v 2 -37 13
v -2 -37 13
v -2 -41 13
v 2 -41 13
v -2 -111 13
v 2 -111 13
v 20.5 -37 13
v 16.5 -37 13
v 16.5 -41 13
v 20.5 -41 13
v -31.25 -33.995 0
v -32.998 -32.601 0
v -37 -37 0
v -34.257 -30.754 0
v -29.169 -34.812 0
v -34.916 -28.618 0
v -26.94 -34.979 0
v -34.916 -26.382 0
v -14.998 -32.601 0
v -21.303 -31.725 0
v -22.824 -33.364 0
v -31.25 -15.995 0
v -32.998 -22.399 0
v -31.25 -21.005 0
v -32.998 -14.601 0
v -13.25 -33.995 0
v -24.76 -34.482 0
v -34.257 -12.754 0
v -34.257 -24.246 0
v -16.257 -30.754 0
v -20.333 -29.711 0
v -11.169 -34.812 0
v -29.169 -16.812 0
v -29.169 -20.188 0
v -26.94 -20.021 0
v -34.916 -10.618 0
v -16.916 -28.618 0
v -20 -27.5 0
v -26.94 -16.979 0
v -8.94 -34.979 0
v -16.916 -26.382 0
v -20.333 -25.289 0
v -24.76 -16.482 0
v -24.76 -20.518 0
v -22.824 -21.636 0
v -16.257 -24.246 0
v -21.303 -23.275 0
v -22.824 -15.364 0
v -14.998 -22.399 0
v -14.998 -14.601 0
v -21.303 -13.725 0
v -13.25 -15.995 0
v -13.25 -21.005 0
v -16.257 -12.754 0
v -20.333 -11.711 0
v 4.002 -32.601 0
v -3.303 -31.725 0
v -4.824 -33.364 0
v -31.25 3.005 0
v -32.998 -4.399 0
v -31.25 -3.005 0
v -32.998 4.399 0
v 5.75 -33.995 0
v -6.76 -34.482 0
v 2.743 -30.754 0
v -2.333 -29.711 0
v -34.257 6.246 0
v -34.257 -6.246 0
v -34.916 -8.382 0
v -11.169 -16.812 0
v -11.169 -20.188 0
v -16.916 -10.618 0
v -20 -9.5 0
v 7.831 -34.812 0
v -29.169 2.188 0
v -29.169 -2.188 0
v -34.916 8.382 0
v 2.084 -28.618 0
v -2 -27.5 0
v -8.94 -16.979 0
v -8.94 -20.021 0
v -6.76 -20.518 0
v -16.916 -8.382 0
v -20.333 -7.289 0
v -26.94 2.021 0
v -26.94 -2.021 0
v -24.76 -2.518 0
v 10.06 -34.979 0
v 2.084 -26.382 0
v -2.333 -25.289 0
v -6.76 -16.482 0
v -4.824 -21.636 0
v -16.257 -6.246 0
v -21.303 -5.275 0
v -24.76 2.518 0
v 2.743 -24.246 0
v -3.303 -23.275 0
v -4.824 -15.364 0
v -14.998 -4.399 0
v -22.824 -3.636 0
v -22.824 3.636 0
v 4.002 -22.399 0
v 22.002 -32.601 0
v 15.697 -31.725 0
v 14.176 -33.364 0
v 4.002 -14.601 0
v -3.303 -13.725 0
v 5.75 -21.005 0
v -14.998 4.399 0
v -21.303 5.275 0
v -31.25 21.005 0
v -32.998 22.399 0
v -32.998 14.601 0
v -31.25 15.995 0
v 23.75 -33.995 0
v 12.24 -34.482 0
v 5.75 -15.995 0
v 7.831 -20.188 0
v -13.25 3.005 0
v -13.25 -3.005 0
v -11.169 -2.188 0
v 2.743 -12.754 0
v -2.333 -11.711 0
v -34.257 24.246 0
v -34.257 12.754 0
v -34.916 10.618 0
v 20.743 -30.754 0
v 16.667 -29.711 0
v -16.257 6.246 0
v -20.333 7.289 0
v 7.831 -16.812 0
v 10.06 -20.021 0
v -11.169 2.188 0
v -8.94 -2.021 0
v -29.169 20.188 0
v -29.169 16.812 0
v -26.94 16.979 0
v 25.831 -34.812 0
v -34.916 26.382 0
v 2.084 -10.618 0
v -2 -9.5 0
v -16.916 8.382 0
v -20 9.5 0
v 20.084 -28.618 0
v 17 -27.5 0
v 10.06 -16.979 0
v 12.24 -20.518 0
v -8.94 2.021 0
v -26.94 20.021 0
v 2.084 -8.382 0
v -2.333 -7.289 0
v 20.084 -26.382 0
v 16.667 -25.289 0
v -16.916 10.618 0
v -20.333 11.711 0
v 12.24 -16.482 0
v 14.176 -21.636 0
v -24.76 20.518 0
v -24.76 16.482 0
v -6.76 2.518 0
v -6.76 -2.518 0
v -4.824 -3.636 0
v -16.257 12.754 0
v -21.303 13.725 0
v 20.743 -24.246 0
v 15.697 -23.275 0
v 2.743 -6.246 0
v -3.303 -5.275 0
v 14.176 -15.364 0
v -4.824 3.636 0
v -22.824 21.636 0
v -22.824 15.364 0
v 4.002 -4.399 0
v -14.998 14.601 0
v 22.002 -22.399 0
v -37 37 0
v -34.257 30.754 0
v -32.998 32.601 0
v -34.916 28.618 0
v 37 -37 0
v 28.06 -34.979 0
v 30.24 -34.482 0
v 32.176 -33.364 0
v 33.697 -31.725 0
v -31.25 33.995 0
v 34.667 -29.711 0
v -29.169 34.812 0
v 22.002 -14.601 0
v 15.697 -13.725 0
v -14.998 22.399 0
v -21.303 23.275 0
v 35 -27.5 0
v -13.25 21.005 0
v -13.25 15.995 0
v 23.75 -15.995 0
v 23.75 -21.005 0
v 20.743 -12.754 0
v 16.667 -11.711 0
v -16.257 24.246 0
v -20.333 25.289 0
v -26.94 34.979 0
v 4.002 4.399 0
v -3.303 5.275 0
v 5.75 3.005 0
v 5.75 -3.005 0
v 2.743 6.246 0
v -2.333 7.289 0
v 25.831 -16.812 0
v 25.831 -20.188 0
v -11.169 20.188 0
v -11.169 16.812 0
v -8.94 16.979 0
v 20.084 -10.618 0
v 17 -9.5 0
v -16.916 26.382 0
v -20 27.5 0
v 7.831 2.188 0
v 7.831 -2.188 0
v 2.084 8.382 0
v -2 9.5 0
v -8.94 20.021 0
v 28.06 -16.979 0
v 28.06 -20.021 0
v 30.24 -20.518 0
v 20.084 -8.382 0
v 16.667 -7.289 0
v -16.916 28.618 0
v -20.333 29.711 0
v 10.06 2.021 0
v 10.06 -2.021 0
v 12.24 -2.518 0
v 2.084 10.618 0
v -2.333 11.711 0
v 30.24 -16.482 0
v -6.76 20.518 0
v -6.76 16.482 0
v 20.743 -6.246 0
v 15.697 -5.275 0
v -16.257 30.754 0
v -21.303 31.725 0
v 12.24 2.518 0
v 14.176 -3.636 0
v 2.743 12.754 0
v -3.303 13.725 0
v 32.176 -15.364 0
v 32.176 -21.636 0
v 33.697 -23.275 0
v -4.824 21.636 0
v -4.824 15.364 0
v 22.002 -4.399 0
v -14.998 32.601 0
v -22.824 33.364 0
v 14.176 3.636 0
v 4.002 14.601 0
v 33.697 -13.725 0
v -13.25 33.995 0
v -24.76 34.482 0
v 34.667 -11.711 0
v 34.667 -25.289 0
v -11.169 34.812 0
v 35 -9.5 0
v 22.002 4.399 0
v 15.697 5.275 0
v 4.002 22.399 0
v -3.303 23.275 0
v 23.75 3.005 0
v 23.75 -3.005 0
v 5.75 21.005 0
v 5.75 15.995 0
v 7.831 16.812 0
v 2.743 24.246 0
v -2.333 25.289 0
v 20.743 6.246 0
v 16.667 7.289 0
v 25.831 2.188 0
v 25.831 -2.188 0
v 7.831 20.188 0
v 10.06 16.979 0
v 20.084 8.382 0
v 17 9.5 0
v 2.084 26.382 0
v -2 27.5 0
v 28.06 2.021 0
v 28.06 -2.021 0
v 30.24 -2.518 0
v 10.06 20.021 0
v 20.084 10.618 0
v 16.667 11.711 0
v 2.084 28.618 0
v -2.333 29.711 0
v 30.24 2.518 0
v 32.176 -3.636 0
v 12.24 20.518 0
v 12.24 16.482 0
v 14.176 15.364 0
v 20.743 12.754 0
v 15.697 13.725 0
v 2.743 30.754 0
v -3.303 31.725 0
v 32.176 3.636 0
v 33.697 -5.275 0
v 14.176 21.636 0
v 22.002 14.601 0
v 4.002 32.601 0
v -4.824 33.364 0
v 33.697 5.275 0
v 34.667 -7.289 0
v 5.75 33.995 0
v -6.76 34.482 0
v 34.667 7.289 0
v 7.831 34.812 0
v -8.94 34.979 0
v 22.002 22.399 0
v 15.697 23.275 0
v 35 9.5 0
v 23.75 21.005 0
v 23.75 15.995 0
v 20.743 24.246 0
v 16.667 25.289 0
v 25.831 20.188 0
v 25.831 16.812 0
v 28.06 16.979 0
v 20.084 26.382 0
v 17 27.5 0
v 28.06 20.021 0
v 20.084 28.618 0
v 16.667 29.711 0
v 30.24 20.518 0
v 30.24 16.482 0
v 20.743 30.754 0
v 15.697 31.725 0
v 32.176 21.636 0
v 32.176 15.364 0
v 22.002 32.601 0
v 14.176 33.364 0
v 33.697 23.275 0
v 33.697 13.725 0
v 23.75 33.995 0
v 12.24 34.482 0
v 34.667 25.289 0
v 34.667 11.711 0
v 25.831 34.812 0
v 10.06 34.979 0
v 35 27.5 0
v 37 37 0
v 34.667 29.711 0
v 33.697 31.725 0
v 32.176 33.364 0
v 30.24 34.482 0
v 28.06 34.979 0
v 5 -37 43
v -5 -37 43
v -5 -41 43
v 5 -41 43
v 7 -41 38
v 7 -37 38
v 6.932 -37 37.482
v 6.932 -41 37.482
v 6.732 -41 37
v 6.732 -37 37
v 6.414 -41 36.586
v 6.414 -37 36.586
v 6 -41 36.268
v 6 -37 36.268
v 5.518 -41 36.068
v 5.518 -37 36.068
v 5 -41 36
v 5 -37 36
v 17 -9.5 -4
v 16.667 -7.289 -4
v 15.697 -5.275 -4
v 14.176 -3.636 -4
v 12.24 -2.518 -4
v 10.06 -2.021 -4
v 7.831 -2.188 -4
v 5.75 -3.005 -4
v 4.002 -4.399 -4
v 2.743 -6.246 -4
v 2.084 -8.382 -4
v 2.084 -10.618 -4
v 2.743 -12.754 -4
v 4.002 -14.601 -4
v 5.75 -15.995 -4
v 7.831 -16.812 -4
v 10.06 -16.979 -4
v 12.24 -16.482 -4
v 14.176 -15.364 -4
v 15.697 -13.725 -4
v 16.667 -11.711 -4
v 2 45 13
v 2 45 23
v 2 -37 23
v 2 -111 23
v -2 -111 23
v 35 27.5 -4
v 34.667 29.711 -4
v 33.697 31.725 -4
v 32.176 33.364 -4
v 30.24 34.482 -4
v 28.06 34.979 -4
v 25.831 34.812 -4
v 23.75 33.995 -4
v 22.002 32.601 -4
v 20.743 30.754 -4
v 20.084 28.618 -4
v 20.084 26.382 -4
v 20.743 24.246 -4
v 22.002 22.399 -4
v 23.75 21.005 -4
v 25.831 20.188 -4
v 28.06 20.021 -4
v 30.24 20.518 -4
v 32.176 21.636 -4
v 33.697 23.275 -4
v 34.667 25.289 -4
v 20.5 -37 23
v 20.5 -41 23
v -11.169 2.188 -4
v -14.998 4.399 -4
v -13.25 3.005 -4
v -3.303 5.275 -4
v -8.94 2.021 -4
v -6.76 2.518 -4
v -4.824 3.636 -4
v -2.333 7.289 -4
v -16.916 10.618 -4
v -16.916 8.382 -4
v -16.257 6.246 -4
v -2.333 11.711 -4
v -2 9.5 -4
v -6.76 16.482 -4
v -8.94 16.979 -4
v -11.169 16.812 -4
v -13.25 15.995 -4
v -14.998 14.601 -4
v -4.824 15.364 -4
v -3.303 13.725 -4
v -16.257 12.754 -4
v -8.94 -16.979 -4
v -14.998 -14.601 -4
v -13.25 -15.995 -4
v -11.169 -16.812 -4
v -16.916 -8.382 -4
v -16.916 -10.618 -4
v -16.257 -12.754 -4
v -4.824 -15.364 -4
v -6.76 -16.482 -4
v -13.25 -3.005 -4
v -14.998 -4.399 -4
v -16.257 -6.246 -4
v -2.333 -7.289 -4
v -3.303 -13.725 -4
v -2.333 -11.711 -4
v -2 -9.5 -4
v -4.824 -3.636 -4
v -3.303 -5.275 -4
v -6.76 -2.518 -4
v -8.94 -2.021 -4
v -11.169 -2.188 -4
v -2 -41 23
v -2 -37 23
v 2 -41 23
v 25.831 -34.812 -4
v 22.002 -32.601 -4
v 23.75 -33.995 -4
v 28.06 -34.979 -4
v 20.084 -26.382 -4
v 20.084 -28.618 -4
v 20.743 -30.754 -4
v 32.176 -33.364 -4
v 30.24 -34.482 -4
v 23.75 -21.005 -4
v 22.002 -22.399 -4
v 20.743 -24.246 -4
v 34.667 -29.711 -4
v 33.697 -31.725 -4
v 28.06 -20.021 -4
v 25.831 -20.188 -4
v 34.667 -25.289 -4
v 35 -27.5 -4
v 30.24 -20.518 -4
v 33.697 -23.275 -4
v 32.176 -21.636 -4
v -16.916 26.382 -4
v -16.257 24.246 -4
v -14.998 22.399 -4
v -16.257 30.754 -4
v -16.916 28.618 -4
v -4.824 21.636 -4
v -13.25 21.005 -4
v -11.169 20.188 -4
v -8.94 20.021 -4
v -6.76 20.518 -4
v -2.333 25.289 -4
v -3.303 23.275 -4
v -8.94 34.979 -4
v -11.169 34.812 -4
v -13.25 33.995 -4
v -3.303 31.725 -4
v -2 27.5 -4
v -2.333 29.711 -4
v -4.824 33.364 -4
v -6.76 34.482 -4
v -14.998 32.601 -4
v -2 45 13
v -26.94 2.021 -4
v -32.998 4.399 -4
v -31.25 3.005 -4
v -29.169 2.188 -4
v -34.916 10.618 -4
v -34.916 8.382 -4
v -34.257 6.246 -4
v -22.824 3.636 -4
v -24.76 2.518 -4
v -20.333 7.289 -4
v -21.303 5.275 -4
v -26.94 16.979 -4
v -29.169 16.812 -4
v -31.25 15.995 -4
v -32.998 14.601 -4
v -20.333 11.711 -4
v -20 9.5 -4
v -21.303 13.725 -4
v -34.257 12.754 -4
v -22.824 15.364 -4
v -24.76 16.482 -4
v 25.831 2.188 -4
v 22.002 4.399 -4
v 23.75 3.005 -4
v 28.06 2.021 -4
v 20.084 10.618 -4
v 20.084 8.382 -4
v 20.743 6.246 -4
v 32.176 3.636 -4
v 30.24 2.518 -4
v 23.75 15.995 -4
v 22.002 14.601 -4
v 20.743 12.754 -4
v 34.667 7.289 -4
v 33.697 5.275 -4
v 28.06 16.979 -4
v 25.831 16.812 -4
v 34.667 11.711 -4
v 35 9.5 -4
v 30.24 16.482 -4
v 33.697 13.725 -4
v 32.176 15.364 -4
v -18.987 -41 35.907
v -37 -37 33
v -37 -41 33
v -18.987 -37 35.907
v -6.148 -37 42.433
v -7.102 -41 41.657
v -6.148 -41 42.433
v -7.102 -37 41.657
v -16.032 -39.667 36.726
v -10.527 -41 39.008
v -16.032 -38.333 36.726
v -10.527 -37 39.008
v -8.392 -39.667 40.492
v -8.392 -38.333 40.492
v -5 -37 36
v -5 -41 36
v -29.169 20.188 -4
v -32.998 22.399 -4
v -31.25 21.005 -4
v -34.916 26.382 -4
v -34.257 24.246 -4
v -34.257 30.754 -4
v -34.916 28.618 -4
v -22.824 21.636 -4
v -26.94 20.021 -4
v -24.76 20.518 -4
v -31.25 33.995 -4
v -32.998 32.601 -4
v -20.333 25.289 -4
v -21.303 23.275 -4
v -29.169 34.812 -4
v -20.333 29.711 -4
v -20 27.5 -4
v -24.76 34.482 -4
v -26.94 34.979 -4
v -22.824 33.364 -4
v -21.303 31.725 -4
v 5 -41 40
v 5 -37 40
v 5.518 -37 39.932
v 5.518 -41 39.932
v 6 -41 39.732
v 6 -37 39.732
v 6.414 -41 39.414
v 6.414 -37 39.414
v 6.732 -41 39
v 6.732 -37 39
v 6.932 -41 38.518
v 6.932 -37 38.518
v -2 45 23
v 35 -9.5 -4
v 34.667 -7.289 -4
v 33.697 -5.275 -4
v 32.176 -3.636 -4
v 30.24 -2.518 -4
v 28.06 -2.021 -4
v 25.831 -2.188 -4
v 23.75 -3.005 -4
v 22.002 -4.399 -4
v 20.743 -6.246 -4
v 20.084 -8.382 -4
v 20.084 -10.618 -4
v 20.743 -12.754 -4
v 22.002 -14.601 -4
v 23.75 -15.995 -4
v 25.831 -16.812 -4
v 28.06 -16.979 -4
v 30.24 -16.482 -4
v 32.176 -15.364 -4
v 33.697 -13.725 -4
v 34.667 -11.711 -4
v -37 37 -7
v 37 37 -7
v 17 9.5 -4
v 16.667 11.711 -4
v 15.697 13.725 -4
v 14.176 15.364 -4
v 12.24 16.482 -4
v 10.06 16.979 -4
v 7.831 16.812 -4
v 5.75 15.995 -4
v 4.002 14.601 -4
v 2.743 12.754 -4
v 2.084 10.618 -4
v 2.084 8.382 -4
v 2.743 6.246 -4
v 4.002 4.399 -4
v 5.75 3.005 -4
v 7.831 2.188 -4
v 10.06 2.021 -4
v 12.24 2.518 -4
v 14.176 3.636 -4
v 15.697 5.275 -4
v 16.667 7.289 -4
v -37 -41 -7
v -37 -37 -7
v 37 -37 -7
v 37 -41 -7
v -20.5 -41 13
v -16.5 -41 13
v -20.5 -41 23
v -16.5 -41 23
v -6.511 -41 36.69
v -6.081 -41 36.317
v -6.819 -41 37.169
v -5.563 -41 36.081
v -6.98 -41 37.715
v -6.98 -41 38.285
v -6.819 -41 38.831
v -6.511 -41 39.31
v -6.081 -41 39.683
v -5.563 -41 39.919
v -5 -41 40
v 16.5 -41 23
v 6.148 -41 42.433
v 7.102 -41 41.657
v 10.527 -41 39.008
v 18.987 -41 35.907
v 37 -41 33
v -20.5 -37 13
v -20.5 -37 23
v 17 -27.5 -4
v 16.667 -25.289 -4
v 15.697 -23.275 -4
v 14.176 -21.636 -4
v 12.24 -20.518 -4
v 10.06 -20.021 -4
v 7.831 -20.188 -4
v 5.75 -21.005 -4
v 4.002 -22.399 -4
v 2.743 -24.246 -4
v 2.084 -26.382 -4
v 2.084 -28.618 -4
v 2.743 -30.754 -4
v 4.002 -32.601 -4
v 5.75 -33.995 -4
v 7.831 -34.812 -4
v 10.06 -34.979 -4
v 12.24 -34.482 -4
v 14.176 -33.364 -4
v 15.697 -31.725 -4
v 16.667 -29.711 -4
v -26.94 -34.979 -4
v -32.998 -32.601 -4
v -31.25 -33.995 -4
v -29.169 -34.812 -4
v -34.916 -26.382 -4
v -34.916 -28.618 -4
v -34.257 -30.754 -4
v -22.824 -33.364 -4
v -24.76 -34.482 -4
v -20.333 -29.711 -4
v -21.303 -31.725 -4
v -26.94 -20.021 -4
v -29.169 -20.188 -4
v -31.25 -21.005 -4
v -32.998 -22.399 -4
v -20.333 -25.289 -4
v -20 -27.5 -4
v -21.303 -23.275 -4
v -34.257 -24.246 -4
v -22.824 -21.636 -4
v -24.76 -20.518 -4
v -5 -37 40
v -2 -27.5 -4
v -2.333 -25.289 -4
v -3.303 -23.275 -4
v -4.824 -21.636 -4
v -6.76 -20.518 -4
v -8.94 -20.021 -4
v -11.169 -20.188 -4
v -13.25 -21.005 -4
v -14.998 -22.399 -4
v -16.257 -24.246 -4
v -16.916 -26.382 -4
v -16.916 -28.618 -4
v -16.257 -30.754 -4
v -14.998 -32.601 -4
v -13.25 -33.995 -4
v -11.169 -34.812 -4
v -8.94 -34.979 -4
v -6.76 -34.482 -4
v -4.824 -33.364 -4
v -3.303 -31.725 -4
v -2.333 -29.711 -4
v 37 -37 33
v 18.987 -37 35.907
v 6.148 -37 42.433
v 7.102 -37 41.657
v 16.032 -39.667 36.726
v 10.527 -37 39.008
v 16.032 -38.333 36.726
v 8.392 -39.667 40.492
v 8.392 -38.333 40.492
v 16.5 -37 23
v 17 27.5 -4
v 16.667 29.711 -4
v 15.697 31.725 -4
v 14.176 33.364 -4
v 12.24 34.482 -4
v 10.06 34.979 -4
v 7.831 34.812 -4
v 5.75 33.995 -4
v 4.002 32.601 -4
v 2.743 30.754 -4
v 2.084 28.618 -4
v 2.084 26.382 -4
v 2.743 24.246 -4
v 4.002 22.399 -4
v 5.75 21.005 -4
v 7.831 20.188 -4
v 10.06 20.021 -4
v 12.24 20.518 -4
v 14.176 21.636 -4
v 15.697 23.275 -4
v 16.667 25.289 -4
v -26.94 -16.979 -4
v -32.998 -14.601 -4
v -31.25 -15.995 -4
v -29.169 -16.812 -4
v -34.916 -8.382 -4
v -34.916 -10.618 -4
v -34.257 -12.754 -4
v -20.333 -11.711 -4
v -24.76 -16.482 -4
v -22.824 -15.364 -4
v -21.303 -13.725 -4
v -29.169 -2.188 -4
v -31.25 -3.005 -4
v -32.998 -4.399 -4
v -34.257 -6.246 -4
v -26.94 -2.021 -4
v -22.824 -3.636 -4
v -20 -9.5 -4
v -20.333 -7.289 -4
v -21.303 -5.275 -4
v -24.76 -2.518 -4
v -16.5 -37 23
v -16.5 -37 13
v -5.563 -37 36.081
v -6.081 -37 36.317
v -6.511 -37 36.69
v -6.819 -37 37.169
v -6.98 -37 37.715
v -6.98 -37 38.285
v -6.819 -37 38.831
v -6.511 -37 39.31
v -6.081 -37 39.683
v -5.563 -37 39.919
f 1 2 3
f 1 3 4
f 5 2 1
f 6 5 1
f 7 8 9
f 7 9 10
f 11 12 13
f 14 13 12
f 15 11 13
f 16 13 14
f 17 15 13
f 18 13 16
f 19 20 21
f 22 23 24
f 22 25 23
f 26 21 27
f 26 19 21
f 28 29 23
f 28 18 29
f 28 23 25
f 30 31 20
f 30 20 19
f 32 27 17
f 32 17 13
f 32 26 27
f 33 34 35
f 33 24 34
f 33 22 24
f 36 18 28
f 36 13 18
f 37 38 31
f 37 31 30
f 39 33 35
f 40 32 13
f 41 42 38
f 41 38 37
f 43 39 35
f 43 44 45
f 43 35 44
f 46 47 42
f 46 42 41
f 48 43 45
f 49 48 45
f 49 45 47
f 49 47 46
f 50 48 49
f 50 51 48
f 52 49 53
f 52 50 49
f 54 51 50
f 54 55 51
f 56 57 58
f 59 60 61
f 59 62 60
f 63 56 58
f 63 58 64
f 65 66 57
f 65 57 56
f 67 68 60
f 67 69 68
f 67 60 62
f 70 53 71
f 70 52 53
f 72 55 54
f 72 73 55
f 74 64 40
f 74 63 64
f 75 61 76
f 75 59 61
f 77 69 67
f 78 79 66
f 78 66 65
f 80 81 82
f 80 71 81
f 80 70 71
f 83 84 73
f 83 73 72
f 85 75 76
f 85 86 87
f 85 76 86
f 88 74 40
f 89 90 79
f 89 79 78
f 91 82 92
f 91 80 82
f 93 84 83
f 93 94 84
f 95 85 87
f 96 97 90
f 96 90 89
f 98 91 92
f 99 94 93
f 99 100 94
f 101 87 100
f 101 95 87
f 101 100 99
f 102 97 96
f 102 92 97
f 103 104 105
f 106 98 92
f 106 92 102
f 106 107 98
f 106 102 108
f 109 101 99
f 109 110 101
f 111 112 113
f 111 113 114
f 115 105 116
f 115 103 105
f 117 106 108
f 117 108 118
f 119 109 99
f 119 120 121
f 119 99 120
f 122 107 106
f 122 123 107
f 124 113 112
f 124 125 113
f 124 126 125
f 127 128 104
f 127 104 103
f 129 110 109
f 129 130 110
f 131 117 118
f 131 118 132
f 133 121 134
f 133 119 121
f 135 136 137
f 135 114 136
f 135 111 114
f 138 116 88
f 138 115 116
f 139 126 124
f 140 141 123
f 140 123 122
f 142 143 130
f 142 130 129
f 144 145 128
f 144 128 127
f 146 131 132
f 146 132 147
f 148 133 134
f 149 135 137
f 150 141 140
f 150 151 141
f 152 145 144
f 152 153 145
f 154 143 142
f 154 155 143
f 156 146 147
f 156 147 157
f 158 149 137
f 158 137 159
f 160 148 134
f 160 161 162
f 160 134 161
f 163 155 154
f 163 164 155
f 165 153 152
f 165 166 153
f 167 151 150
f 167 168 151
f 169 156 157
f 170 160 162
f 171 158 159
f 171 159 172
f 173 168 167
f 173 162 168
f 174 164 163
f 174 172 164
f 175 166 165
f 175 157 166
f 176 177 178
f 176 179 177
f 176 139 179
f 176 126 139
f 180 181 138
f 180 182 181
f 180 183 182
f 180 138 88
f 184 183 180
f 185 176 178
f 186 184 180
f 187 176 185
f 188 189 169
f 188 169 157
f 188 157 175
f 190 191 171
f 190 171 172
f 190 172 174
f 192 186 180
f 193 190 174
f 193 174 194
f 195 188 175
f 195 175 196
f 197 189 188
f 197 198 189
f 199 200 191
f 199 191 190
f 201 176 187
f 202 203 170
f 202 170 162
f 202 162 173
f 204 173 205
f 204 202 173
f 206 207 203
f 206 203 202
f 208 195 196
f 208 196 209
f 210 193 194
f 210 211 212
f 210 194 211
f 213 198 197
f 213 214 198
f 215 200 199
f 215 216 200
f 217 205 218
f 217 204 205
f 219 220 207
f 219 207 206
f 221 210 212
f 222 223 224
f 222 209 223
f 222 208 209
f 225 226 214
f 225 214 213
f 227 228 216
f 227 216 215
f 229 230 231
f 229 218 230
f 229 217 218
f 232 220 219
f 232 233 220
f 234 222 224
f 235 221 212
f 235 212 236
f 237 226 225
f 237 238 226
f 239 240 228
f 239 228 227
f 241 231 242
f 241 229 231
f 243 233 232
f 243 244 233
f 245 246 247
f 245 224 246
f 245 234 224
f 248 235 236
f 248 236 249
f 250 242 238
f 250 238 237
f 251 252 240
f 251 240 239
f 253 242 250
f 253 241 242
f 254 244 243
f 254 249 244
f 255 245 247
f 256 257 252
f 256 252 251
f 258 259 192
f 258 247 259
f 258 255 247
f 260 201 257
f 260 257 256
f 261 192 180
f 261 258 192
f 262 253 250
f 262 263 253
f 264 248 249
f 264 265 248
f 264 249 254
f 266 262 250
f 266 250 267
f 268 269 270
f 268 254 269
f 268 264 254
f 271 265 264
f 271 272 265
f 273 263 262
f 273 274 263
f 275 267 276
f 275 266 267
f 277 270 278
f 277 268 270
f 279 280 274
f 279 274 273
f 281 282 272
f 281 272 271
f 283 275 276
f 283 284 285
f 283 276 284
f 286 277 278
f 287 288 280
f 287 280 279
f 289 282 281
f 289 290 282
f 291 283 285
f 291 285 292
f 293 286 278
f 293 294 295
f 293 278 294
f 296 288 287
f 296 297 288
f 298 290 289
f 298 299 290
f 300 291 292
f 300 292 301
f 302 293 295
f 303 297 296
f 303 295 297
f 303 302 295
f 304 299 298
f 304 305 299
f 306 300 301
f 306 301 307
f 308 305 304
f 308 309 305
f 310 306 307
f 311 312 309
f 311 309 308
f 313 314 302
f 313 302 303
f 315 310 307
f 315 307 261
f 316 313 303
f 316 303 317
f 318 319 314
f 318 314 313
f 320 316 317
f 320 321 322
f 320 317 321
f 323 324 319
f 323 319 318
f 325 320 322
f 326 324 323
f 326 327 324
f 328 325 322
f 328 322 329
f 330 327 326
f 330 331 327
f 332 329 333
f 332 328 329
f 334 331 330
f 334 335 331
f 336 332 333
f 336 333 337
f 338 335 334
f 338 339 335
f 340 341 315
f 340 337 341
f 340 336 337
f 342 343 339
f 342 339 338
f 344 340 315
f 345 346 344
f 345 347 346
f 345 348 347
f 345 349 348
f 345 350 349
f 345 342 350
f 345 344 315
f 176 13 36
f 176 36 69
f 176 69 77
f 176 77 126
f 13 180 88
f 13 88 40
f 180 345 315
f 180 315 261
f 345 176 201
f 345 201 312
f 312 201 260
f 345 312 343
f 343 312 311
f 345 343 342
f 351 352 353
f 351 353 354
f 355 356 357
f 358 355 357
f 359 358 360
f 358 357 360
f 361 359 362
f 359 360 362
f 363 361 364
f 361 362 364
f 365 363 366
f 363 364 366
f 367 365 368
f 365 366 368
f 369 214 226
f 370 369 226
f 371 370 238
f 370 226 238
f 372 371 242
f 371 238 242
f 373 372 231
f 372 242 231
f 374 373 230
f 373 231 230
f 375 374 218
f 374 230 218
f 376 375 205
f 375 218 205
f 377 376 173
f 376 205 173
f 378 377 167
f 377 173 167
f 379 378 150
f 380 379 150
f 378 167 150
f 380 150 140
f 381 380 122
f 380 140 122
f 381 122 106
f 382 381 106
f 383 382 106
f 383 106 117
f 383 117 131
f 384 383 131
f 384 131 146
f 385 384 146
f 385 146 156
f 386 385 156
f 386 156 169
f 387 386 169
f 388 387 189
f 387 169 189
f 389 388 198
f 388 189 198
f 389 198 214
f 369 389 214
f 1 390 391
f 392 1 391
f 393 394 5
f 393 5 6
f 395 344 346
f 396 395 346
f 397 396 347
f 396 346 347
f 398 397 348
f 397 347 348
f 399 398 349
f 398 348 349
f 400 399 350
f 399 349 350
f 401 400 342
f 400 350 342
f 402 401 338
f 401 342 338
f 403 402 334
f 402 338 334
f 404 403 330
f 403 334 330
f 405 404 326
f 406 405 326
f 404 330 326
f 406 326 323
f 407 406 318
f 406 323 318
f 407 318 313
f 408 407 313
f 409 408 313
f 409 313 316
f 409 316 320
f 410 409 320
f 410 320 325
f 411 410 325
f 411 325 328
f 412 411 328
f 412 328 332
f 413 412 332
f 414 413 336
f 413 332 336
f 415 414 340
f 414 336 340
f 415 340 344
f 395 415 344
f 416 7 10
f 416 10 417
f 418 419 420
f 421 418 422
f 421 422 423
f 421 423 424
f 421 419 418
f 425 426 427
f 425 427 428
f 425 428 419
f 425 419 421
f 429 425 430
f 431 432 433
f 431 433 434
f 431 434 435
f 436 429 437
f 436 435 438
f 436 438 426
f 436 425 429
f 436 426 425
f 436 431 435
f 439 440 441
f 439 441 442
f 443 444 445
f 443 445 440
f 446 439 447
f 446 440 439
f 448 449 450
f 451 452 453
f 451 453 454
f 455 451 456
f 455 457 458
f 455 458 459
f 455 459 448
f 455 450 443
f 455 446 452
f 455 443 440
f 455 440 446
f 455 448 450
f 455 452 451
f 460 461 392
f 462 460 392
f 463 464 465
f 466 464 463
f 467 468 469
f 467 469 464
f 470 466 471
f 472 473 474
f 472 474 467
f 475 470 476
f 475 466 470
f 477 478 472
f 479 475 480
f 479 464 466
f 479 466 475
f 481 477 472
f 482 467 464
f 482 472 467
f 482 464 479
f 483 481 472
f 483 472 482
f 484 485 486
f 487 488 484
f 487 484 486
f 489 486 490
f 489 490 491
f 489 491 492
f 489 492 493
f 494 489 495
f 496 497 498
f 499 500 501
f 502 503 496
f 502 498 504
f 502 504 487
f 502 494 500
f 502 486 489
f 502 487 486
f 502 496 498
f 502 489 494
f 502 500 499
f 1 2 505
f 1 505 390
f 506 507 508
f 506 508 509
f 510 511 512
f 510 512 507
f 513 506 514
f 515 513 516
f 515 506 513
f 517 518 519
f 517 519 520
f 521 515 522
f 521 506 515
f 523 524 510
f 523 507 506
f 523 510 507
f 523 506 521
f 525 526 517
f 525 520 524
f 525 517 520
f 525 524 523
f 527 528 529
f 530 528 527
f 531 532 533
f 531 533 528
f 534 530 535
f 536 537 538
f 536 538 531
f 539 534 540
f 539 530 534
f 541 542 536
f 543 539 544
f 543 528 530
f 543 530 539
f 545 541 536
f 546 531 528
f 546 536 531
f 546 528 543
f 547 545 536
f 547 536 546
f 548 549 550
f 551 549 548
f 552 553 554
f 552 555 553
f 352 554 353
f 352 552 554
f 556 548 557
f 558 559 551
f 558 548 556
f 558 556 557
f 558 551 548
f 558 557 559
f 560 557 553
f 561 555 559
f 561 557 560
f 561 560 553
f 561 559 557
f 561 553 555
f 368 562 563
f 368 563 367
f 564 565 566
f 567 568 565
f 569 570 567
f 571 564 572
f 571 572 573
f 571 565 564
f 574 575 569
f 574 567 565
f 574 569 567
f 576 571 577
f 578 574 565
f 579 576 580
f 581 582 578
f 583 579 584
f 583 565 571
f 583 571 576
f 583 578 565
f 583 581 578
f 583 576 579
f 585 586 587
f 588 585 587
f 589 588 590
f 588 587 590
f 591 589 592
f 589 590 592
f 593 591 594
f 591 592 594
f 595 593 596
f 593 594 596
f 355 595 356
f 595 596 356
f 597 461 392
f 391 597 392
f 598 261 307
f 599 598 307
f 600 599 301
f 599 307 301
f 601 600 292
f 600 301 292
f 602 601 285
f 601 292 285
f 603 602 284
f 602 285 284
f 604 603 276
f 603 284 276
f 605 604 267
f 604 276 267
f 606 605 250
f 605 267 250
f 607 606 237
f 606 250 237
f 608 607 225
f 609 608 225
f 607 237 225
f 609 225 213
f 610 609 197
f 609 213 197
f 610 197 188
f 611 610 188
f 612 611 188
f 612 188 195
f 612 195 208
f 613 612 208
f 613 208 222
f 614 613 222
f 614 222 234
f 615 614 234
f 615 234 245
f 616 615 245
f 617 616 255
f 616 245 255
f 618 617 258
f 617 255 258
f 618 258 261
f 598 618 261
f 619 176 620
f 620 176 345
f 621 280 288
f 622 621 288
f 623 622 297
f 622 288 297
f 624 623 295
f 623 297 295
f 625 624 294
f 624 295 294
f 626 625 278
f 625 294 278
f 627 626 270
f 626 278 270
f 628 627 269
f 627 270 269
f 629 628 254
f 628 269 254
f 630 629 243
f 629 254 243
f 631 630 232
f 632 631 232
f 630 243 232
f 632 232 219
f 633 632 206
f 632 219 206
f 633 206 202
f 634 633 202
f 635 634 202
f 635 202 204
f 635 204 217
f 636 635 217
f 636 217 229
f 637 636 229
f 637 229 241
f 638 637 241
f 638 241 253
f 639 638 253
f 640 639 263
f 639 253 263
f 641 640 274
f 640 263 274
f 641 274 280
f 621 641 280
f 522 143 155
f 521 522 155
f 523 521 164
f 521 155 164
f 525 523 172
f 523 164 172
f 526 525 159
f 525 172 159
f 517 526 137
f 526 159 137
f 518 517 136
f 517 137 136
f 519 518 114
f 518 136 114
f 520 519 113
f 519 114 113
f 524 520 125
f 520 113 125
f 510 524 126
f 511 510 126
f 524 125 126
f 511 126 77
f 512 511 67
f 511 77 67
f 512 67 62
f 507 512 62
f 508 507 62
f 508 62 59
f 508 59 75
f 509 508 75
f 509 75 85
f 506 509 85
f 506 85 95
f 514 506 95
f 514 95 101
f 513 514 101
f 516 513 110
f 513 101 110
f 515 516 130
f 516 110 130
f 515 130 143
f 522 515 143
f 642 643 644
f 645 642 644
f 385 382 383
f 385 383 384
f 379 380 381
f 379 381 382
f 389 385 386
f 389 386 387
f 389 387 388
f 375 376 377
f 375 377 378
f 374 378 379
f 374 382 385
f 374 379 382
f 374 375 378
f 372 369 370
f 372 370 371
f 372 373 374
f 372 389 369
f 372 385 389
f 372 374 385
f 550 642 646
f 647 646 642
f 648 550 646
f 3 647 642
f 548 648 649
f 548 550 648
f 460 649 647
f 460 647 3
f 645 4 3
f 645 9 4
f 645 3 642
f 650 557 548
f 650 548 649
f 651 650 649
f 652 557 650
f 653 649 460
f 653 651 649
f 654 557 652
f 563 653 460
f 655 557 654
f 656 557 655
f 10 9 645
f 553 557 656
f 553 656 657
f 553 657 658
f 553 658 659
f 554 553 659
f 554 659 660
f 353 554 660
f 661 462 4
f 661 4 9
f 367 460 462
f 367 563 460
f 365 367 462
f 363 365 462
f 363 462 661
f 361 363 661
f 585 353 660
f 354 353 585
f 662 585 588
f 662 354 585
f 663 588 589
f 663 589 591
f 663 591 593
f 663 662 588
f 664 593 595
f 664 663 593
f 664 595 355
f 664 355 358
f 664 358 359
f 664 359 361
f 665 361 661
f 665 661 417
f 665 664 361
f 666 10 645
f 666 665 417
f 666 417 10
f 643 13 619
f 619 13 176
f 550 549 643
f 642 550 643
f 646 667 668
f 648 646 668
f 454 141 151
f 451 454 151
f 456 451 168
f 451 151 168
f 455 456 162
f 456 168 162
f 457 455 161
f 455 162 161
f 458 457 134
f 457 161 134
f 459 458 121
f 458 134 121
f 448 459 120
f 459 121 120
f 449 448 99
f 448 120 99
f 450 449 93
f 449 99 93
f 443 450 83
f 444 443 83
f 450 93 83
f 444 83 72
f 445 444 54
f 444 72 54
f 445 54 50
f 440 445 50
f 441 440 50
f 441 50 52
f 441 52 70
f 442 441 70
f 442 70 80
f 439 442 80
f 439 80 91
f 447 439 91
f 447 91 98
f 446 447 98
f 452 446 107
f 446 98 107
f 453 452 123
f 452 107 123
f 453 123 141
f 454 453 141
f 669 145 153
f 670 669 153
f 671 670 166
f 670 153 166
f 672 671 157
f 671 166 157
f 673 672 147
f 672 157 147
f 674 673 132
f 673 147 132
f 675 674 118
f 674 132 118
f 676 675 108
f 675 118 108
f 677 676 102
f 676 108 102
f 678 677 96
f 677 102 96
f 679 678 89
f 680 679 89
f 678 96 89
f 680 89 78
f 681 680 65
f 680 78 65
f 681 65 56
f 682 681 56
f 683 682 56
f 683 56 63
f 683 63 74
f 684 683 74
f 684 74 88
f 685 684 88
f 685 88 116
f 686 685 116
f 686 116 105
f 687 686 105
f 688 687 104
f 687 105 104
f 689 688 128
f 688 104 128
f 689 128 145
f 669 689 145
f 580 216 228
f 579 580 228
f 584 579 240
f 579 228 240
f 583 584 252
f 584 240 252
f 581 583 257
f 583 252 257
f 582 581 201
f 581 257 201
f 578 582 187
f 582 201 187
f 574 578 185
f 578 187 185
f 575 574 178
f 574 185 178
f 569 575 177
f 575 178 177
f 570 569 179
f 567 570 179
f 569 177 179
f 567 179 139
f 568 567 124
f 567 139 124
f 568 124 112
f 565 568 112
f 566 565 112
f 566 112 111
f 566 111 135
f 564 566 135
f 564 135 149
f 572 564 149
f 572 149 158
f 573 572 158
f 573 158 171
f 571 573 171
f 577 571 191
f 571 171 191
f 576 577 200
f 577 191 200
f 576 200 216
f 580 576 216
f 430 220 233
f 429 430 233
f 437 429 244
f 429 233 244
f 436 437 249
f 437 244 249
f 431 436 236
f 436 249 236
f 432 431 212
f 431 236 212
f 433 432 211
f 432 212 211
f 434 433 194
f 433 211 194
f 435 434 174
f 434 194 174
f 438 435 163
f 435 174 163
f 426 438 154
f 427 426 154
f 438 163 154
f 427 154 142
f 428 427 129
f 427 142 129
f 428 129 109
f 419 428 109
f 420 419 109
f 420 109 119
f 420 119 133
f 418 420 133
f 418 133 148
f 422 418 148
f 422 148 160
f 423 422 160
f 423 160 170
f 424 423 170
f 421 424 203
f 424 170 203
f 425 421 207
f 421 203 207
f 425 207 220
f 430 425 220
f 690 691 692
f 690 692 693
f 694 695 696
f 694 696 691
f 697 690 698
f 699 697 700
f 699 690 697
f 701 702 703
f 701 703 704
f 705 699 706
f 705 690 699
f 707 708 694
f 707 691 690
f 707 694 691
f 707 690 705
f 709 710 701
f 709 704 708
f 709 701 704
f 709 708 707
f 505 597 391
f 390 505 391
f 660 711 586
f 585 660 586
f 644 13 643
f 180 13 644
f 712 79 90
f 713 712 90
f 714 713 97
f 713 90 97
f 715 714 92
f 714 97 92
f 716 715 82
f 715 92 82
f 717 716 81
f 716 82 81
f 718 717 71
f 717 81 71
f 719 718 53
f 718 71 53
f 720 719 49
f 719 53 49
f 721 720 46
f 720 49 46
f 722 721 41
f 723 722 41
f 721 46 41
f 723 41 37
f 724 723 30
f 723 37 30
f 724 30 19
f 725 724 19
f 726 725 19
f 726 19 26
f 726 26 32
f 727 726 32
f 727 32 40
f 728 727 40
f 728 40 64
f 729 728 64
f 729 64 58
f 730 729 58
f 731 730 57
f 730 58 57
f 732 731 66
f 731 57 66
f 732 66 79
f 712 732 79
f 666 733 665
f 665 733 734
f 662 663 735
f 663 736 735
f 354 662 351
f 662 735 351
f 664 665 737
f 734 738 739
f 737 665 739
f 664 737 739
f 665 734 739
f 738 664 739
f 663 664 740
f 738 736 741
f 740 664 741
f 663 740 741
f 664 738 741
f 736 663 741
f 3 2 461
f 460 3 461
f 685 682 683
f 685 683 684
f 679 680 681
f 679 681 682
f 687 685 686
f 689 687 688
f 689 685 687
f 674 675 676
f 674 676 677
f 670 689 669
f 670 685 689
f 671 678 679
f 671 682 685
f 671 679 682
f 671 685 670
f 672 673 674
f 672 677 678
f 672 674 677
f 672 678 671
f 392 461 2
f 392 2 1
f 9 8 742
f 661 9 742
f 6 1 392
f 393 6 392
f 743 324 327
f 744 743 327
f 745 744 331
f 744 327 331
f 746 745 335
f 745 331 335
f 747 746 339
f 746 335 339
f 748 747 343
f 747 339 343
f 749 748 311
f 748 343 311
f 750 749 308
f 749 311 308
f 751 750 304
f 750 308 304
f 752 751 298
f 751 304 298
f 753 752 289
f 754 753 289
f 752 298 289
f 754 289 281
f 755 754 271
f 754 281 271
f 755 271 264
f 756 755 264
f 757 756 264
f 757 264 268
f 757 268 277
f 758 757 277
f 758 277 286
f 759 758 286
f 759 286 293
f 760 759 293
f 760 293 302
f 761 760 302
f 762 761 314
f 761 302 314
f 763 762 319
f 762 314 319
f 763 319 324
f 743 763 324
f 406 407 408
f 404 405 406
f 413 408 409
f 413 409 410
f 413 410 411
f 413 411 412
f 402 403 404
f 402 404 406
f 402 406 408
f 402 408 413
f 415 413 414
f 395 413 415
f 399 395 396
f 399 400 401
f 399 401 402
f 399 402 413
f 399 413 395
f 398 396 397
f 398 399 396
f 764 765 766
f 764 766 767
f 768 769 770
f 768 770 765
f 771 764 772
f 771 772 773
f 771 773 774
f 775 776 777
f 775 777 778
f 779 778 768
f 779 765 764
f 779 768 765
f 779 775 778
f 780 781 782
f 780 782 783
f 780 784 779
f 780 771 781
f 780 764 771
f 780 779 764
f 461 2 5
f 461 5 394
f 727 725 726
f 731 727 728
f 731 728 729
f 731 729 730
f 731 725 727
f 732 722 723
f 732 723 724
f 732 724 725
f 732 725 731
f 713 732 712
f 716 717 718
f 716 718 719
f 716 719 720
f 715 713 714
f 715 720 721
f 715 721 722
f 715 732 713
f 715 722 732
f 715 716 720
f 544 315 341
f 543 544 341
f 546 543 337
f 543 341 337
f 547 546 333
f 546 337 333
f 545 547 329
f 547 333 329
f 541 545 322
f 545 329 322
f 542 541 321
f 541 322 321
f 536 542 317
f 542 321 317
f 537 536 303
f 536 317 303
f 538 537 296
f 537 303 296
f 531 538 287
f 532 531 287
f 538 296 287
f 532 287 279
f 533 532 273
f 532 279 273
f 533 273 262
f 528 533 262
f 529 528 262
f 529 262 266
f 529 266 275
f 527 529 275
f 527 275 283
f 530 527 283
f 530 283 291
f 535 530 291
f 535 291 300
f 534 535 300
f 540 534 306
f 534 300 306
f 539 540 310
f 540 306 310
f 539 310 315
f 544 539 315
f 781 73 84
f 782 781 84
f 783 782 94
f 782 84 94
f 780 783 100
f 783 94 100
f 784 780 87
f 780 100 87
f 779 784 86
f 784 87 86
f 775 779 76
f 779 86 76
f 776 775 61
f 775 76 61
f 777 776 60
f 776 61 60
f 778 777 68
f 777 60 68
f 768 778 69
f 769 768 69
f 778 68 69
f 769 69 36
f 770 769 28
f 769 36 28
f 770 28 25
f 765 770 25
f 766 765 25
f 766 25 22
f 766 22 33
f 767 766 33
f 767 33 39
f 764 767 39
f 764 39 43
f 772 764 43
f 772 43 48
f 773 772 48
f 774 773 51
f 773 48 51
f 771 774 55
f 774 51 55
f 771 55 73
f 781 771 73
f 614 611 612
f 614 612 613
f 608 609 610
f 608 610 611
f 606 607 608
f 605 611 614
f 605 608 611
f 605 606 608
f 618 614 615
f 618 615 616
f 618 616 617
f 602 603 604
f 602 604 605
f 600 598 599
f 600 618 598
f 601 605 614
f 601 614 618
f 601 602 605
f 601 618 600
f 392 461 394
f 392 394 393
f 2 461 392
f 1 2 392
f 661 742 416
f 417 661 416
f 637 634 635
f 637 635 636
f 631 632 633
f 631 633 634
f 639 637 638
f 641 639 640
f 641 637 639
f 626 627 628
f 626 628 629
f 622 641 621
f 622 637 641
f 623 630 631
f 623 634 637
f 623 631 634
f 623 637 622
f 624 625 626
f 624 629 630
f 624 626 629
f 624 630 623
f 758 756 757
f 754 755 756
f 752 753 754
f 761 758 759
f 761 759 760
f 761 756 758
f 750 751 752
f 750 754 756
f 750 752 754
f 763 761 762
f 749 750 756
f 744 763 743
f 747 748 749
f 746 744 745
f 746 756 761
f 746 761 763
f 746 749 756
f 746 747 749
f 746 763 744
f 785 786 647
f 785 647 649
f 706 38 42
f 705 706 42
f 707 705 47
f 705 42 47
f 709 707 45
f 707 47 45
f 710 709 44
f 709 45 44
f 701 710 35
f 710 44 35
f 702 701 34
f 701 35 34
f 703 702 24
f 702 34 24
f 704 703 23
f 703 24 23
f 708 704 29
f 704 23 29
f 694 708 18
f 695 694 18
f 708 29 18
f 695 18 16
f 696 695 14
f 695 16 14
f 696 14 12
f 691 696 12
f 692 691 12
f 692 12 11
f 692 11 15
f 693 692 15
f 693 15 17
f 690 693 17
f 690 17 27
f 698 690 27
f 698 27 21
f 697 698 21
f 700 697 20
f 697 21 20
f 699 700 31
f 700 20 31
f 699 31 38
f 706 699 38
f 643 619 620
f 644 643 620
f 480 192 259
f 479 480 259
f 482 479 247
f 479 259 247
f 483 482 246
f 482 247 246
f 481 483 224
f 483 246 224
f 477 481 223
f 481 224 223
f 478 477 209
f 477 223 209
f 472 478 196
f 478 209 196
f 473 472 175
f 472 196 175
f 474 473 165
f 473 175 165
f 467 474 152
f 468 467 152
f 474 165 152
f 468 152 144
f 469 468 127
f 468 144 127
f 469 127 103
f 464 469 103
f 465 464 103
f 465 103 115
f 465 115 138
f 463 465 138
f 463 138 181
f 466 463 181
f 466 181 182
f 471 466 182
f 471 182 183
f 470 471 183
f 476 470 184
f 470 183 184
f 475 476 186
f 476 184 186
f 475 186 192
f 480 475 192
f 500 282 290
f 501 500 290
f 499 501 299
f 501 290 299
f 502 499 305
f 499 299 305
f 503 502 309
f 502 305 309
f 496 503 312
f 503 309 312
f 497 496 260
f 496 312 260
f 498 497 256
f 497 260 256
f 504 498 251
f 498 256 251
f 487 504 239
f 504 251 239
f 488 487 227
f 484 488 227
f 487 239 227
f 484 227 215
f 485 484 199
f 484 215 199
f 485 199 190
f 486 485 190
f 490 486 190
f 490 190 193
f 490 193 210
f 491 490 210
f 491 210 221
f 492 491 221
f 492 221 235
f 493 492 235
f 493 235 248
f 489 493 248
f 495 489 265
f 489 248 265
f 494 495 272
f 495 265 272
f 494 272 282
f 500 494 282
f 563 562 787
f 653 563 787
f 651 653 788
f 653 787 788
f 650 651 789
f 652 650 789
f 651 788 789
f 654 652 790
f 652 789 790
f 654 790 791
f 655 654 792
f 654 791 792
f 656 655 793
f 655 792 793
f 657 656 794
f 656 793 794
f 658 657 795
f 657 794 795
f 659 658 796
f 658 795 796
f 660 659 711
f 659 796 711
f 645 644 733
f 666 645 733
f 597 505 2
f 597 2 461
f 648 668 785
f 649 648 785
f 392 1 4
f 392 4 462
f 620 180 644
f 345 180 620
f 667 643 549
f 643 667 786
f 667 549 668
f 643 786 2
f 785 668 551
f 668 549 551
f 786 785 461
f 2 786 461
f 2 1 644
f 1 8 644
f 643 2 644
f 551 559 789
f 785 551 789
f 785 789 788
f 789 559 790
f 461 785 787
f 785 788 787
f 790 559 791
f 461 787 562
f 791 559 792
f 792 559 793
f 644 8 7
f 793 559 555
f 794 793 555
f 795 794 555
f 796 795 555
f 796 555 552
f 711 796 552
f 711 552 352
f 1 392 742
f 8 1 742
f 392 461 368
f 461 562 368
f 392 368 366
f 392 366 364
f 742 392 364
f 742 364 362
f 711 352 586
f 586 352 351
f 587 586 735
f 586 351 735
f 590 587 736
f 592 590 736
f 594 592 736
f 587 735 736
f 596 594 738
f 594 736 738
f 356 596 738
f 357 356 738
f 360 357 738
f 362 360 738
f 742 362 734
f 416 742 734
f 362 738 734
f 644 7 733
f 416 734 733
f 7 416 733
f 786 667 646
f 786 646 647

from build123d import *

# Parameters (mm, degrees)
F1_W     = 74
F1_H     = 74
F1_R     = 7.5
F2_DEPTH = 7
F3_DEPTH = 4
F4_W     = 4
F4_H     = 10
F4_W_2   = 10
F4_H_2   = 3
F5_DEPTH = 4
F6_DEPTH = 82
F7_DEPTH = 74


with BuildPart() as f2:
    # F1 (on Top) → F2 (new body)
    with BuildSketch(Plane.XY):
        Rectangle(F1_W, F1_H)
        with Locations((-27.5, -27.5)):
            Circle(F1_R, mode=Mode.SUBTRACT)
        with Locations((-9.5, -27.5)):
            Circle(F1_R, mode=Mode.SUBTRACT)
        with Locations((-27.5, -9.5)):
            Circle(F1_R, mode=Mode.SUBTRACT)
        with Locations((-9.5, -9.5)):
            Circle(F1_R, mode=Mode.SUBTRACT)
        with Locations((9.5, -27.5)):
            Circle(F1_R, mode=Mode.SUBTRACT)
        with Locations((27.5, -27.5)):
            Circle(F1_R, mode=Mode.SUBTRACT)
        with Locations((9.5, -9.5)):
            Circle(F1_R, mode=Mode.SUBTRACT)
        with Locations((27.5, -9.5)):
            Circle(F1_R, mode=Mode.SUBTRACT)
        with Locations((-27.5, 9.5)):
            Circle(F1_R, mode=Mode.SUBTRACT)
        with Locations((-9.5, 9.5)):
            Circle(F1_R, mode=Mode.SUBTRACT)
        with Locations((-27.5, 27.5)):
            Circle(F1_R, mode=Mode.SUBTRACT)
        with Locations((-9.5, 27.5)):
            Circle(F1_R, mode=Mode.SUBTRACT)
        with Locations((9.5, 9.5)):
            Circle(F1_R, mode=Mode.SUBTRACT)
        with Locations((27.5, 9.5)):
            Circle(F1_R, mode=Mode.SUBTRACT)
        with Locations((9.5, 27.5)):
            Circle(F1_R, mode=Mode.SUBTRACT)
        with Locations((27.5, 27.5)):
            Circle(F1_R, mode=Mode.SUBTRACT)
        with Locations((-27.5, 27.5)):
            Circle(F1_R)
        with Locations((-27.5, -27.5)):
            Circle(F1_R)
        with Locations((27.5, 27.5)):
            Circle(F1_R)
        with Locations((27.5, -27.5)):
            Circle(F1_R)
        with Locations((-27.5, -9.5)):
            Circle(F1_R)
        with Locations((-27.5, 9.5)):
            Circle(F1_R)
        with Locations((-9.5, 27.5)):
            Circle(F1_R)
        with Locations((-9.5, 9.5)):
            Circle(F1_R)
        with Locations((-9.5, -9.5)):
            Circle(F1_R)
        with Locations((-9.5, -27.5)):
            Circle(F1_R)
        with Locations((9.5, -27.5)):
            Circle(F1_R)
        with Locations((9.5, -9.5)):
            Circle(F1_R)
        with Locations((9.5, 9.5)):
            Circle(F1_R)
        with Locations((9.5, 27.5)):
            Circle(F1_R)
        with Locations((27.5, -9.5)):
            Circle(F1_R)
        with Locations((27.5, 9.5)):
            Circle(F1_R)
    extrude(amount=-F2_DEPTH)

    # F1 (on Top) → F3 (cut)
    with BuildSketch(Plane.XY):
        with Locations((-27.5, -27.5)):
            Circle(F1_R)
        with Locations((-27.5, 27.5)):
            Circle(F1_R)
        with Locations((27.5, 27.5)):
            Circle(F1_R)
        with Locations((27.5, -27.5)):
            Circle(F1_R)
        with Locations((-27.5, -9.5)):
            Circle(F1_R)
        with Locations((-27.5, 9.5)):
            Circle(F1_R)
        with Locations((-9.5, -27.5)):
            Circle(F1_R)
        with Locations((-9.5, -9.5)):
            Circle(F1_R)
        with Locations((-9.5, 9.5)):
            Circle(F1_R)
        with Locations((-9.5, 27.5)):
            Circle(F1_R)
        with Locations((9.5, 27.5)):
            Circle(F1_R)
        with Locations((9.5, 9.5)):
            Circle(F1_R)
        with Locations((9.5, -9.5)):
            Circle(F1_R)
        with Locations((9.5, -27.5)):
            Circle(F1_R)
        with Locations((27.5, -9.5)):
            Circle(F1_R)
        with Locations((27.5, 9.5)):
            Circle(F1_R)
    extrude(amount=-F3_DEPTH, mode=Mode.SUBTRACT)


with BuildPart() as f5:
    # F4 (on face) → F5 (new body)
    with BuildSketch(Plane.XZ.offset(37)):
        Polygon((-37, 33), (-37, -7), (37, -7), (37, 33), (5, 33), (-5, 33), align=None)
        with Locations((-18.5, 18)):
            Rectangle(F4_W, F4_H, mode=Mode.SUBTRACT)
        with Locations((0, 18)):
            Rectangle(F4_W, F4_H, mode=Mode.SUBTRACT)
        with Locations((18.5, 18)):
            Rectangle(F4_W, F4_H, mode=Mode.SUBTRACT)
        with BuildLine():
            add(Edge.make_bspline(
                [(-37, 33), (-6.3423160464, 36.2739004195), (-9.2948594391, 41.5539657871), (-5, 43)],
                knots=[0, 0, 0, 0, 33.5261092285, 33.5261092285, 33.5261092285, 33.5261092285], degree=3))
            Line((-37, 33), (-5, 33))
            Line((-5, 33), (-5, 36))
            ThreePointArc((-5, 36), (-7, 38), (-5, 40))
            Line((-5, 40), (-5, 43))
        make_face()
        with BuildLine():
            Line((5, 33), (37, 33))
            add(Edge.make_bspline(
                [(37, 33), (6.3423160464, 36.2739004195), (9.2948594391, 41.5539657871), (5, 43)],
                knots=[0, 0, 0, 0, 33.5261092285, 33.5261092285, 33.5261092285, 33.5261092285], degree=3))
            Line((5, 43), (5, 40))
            ThreePointArc((5, 40), (6.4142135624, 39.4142135624), (7, 38))
            ThreePointArc((7, 38), (6.4142135624, 36.5857864376), (5, 36))
            Line((5, 36), (5, 33))
        make_face()
        with Locations((0, 41.5)):
            Rectangle(F4_W_2, F4_H_2)
        with Locations((0, 34.5)):
            Rectangle(F4_W_2, F4_H_2)
    extrude(amount=F5_DEPTH)

    # F4 (on face) → F6 (join)
    with BuildSketch(Plane.XZ.offset(37)):
        with Locations((0, 18)):
            Rectangle(F4_W, F4_H)
    extrude(amount=-F6_DEPTH)


with BuildPart() as f7:
    # F4 (on face) → F7 (new body)
    with BuildSketch(Plane.XZ.offset(37)):
        with Locations((0, 18)):
            Rectangle(F4_W, F4_H)
    extrude(amount=F7_DEPTH)


solid = Compound([f2.part, f5.part, f7.part])
